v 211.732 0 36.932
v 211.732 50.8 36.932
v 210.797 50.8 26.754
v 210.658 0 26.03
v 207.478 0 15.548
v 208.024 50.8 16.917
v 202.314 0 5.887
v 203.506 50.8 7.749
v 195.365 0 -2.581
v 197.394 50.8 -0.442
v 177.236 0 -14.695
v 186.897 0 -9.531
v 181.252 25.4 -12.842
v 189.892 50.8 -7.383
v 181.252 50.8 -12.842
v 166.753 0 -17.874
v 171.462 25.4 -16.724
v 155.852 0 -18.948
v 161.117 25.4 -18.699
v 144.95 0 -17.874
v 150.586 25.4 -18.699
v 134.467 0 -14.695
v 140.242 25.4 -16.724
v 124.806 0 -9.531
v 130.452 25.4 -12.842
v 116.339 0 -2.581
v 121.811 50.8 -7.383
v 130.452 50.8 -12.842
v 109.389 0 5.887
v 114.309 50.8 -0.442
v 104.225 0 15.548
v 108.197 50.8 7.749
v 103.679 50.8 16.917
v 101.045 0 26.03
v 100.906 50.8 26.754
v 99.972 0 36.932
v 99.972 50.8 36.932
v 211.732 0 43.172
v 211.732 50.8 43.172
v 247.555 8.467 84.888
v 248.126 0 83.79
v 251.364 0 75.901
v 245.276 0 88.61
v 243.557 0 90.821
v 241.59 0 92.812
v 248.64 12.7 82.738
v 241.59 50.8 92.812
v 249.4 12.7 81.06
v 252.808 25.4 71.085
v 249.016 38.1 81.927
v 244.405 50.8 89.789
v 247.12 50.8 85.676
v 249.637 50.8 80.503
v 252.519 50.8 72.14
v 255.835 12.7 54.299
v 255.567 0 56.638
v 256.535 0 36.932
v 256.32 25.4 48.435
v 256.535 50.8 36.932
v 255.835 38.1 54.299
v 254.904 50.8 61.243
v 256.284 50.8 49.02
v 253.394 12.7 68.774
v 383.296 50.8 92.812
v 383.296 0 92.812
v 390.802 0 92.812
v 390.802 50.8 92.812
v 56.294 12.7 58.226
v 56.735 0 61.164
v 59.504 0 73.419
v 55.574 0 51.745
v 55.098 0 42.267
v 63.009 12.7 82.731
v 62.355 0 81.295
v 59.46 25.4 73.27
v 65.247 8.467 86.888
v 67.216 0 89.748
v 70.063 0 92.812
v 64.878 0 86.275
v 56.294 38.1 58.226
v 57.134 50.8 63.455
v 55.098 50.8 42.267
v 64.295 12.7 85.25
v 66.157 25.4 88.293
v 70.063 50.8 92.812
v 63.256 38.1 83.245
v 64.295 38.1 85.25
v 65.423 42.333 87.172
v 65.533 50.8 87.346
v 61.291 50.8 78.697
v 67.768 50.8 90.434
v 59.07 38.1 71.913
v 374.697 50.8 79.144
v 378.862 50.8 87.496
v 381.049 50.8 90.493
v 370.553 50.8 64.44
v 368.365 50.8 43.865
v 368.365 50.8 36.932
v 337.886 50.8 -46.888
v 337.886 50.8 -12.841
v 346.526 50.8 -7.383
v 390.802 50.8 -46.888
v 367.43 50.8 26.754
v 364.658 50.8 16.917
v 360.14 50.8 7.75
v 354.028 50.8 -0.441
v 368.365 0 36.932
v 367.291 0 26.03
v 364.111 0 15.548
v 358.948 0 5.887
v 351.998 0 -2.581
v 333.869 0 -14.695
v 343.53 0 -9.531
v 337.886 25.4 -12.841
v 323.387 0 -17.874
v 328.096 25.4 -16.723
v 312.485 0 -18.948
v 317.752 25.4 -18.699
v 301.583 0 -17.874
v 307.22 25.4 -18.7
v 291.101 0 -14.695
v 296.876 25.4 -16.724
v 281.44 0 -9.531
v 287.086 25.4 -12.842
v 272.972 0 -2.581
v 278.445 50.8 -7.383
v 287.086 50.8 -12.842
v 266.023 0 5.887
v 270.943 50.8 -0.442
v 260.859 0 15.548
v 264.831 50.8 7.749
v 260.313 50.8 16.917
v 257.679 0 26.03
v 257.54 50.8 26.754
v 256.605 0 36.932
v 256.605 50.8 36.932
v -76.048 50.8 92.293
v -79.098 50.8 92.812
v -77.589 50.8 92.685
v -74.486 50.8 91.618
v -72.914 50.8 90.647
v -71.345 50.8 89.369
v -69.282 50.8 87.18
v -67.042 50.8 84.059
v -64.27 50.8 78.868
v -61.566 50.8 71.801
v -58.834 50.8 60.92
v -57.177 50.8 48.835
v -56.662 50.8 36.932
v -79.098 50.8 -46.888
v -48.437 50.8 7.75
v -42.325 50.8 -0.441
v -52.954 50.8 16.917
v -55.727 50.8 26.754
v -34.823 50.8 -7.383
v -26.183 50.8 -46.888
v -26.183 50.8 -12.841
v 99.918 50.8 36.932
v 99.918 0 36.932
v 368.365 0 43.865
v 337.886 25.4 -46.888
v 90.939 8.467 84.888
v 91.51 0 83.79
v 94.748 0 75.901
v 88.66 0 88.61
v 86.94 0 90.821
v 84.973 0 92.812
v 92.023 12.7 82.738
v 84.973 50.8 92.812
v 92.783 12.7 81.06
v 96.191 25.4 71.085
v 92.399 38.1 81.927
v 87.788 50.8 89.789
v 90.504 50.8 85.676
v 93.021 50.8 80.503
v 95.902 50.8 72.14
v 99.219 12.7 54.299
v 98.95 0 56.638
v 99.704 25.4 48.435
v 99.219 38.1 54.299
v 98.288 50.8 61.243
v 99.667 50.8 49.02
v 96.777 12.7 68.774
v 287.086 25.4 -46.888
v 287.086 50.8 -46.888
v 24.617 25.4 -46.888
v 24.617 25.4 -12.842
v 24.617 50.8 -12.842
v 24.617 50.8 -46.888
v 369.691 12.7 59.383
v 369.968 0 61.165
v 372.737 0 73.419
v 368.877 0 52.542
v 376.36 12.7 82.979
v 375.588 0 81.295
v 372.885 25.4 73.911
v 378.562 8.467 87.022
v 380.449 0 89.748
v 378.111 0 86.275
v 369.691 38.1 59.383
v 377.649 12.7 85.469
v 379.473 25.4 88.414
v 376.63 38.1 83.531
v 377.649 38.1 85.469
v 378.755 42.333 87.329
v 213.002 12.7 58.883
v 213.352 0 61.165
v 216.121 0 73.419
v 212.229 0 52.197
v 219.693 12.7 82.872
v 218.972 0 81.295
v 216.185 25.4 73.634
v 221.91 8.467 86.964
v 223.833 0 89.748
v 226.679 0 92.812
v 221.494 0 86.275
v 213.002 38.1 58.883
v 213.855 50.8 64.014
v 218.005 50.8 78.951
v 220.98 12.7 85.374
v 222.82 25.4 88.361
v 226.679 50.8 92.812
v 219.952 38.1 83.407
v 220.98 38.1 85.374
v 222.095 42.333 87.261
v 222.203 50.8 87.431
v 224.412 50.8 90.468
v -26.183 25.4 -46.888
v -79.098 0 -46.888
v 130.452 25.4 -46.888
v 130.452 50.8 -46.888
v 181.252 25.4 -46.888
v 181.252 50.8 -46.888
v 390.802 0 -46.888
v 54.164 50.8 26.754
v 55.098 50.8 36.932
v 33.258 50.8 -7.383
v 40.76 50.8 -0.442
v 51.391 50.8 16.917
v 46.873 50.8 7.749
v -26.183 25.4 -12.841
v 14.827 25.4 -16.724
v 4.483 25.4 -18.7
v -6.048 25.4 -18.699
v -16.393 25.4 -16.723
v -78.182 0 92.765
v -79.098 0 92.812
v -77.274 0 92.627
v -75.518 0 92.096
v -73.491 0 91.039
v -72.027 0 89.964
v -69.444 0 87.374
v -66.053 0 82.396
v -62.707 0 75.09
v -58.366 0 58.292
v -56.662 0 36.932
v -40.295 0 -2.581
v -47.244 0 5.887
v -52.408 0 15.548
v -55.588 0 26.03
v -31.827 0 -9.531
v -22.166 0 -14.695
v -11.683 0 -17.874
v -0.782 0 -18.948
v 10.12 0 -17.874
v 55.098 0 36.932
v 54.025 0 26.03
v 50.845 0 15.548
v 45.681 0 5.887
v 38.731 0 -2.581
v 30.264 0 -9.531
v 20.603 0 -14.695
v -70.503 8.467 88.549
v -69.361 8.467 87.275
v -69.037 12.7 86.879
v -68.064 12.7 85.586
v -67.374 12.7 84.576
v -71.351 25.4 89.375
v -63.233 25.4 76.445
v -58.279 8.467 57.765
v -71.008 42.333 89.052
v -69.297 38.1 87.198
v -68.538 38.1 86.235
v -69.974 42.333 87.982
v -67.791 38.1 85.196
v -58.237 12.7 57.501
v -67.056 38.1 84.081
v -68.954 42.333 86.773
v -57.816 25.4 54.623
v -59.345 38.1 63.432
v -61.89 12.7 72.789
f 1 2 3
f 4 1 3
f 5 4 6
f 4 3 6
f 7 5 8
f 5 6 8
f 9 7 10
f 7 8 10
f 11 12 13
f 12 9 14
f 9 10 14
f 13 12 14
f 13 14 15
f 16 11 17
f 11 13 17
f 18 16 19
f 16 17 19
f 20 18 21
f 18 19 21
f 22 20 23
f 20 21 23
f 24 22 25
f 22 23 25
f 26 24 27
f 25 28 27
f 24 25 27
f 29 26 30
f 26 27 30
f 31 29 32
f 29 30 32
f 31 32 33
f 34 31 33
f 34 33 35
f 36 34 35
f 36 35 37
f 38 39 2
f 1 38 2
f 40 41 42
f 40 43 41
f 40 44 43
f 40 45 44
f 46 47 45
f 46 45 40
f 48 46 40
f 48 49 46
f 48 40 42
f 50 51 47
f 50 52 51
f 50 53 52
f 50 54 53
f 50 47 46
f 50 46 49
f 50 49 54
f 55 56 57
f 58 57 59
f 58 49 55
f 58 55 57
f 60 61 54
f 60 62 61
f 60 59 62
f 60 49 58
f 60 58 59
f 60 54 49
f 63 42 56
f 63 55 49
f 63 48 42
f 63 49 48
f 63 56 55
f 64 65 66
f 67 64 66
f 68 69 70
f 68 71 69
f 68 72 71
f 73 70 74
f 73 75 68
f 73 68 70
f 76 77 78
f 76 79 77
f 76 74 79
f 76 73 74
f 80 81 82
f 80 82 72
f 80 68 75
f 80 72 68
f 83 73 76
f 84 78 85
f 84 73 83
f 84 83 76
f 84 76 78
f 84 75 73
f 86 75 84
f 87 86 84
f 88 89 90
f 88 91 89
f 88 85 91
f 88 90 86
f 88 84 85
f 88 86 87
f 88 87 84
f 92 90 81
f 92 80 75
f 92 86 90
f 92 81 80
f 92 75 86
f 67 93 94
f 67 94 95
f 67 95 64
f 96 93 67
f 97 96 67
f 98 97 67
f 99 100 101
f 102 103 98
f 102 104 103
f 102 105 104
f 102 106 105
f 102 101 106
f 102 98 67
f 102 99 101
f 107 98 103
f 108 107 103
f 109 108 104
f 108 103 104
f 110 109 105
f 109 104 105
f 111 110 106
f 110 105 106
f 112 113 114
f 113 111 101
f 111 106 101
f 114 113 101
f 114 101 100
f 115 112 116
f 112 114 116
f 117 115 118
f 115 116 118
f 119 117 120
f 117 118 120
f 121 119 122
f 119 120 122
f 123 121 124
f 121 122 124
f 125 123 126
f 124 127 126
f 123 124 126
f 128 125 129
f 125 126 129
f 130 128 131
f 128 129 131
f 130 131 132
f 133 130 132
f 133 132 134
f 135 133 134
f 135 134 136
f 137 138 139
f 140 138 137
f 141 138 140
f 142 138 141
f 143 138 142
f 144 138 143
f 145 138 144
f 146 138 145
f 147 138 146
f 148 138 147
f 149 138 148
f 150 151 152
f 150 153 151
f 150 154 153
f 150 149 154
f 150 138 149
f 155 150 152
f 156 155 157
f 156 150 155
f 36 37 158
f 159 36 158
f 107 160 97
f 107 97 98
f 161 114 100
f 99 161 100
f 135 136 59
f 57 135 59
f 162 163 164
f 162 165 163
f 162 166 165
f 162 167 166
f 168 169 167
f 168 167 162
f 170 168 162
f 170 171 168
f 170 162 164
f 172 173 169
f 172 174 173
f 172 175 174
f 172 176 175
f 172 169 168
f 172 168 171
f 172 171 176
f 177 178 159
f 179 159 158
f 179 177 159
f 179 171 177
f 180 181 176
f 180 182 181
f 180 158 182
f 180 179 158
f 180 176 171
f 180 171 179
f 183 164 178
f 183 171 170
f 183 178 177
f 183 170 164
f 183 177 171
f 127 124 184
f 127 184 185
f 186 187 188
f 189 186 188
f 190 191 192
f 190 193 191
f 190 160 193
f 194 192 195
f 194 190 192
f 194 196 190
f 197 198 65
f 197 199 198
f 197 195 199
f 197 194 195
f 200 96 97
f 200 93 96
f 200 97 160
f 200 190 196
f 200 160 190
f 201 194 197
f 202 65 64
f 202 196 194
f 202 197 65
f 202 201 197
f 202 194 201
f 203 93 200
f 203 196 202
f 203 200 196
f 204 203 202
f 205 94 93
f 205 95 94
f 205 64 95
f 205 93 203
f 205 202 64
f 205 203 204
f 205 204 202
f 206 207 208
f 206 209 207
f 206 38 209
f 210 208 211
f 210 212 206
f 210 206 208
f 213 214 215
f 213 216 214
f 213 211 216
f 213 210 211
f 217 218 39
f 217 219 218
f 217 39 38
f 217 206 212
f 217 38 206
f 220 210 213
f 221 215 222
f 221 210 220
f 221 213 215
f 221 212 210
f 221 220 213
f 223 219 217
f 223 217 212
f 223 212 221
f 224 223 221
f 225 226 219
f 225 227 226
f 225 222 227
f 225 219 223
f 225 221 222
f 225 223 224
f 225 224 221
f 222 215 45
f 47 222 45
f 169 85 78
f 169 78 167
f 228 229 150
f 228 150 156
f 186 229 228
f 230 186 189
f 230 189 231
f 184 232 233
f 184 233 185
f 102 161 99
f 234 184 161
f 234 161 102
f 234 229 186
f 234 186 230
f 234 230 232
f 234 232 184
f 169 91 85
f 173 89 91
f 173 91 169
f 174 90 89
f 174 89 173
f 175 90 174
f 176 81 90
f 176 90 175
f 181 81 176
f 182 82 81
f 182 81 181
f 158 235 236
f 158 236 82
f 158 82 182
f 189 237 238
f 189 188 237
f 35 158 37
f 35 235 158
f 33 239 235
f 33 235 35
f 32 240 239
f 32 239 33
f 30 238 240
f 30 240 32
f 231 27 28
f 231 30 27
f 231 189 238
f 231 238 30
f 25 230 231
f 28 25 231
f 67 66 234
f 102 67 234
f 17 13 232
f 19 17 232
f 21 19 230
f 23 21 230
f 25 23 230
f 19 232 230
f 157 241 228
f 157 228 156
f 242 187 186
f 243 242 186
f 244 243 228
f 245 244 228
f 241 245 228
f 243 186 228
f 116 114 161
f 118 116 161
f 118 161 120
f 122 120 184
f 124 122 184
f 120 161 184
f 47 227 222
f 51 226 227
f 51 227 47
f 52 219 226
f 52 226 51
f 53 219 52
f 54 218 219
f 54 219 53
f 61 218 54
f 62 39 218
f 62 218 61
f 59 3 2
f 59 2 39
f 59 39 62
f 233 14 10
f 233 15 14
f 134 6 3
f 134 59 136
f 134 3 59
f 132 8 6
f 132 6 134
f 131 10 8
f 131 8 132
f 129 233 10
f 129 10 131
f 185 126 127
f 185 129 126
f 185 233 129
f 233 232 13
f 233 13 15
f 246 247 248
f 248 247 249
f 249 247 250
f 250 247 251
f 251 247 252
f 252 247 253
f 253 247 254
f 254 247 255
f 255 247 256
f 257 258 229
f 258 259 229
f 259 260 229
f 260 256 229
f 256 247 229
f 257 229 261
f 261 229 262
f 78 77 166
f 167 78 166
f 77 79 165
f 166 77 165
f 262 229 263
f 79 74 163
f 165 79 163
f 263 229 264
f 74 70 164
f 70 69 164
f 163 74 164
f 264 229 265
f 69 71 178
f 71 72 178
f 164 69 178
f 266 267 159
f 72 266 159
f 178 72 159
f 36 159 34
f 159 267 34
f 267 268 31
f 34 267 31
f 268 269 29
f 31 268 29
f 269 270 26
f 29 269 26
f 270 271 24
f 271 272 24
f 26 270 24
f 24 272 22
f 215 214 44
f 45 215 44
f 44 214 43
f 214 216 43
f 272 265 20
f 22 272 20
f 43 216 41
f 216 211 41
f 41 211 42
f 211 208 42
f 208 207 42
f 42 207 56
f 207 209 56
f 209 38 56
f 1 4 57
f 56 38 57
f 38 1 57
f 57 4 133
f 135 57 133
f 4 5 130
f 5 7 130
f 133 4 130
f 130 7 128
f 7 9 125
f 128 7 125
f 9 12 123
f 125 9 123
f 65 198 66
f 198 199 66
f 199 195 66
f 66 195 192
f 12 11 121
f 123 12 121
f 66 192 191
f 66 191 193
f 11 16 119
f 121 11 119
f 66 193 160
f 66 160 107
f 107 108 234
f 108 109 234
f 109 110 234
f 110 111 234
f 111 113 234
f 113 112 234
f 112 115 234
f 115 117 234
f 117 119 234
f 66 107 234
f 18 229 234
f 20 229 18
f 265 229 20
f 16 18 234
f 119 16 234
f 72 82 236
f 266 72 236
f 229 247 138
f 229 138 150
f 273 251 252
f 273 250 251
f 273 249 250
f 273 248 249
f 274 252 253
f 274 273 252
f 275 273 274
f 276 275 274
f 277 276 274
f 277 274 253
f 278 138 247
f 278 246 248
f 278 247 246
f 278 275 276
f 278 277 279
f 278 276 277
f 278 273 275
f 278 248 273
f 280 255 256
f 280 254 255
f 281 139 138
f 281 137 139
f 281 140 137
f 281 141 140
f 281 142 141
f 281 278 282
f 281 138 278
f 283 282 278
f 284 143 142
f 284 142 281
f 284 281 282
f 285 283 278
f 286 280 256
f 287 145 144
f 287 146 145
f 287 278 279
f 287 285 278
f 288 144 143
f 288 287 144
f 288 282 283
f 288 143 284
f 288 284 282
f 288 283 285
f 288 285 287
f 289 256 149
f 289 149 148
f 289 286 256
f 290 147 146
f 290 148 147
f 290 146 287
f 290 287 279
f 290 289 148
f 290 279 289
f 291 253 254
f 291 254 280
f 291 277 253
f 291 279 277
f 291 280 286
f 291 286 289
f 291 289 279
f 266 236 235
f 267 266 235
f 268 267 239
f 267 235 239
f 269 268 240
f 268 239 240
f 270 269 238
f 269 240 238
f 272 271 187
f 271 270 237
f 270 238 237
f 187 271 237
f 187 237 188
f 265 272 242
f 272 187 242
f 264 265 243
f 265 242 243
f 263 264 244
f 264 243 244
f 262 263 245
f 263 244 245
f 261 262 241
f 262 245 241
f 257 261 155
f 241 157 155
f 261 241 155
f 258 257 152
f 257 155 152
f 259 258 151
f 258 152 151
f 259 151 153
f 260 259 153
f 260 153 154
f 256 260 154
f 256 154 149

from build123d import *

# Parameters (mm, degrees)
SKETCH1_W           = 469.9
SKETCH1_H           = 139.7
BOSS_EXTRUDE1_DEPTH = 50.8
SKETCH2_R           = 55.88
CUT_EXTRUDE3_DEPTH  = 405.871109401
CUT_EXTRUDE5_DEPTH  = 405.871109401
SKETCH5_W           = 50.8
SKETCH5_H           = 25.4
CUT_EXTRUDE6_DEPTH  = 419.118003235


with BuildPart() as part:
    # Sketch1 → Boss-Extrude1 (new body)
    with BuildSketch(Plane(origin=(0, 0, 0), x_dir=(1, 0, 0), z_dir=(0, 1, 0))):
        with Locations((155.851656231, -22.96185654)):
            Rectangle(SKETCH1_W, SKETCH1_H)
    extrude(amount=BOSS_EXTRUDE1_DEPTH)

    # Sketch2 → Cut-Extrude3 (cut, through all)
    with BuildSketch(Plane(origin=(0, 50.8, 0), x_dir=(1, 0, 0), z_dir=(0, 1, 0))):
        with BuildLine():
            Line((55.098238231, -92.81185654), (55.098238231, -36.93185654))
            ThreePointArc((55.098238231, -36.93185654), (38.731365092, -76.444983544), (-0.781761972, -92.81185654))
            Line((-0.781761972, -92.81185654), (55.098238231, -92.81185654))
        make_face()
        with BuildLine():
            ThreePointArc((-0.781761972, -92.81185654), (-40.294888773, -76.4449834), (-56.661761769, -36.93185654))
            Line((-56.661761769, -36.93185654), (-56.661761769, -92.81185654))
            Line((-56.661761769, -92.81185654), (-0.781761972, -92.81185654))
        make_face()
        with BuildLine():
            Line((99.971656231, -36.93185654), (99.971656231, -92.81185654))
            Line((99.971656231, -92.81185654), (155.851656231, -92.81185654))
            ThreePointArc((155.851656231, -92.81185654), (116.338529299, -76.444983472), (99.971656231, -36.93185654))
        make_face()
        with BuildLine():
            ThreePointArc((211.731656231, -36.93185654), (195.364783164, -76.444983472), (155.851656231, -92.81185654))
            Line((155.851656231, -92.81185654), (211.731656231, -92.81185654))
            Line((211.731656231, -92.81185654), (211.731656231, -36.93185654))
        make_face()
        with BuildLine():
            Line((256.605074231, -36.93185654), (256.605074231, -92.81185654))
            Line((256.605074231, -92.81185654), (312.485074664, -92.81185654))
            ThreePointArc((312.485074664, -92.81185654), (272.971947451, -76.444983625), (256.605074231, -36.93185654))
        make_face()
        with BuildLine():
            ThreePointArc((368.365074231, -36.93185654), (351.998201317, -76.444983319), (312.485074664, -92.81185654))
            Line((312.485074664, -92.81185654), (368.365074231, -92.81185654))
            Line((368.365074231, -92.81185654), (368.365074231, -36.93185654))
        make_face()
        with Locations((312.485074231, -36.93185654)):
            Circle(SKETCH2_R)
        with Locations((155.851656231, -36.93185654)):
            Circle(SKETCH2_R)
        with Locations((-0.781761769, -36.93185654)):
            Circle(SKETCH2_R)
    extrude(amount=-CUT_EXTRUDE3_DEPTH, mode=Mode.SUBTRACT)

    # Sketch3 → Cut-Extrude5 (cut, through all)
    with BuildSketch(Plane(origin=(0, 50.8, 0), x_dir=(1, 0, 0), z_dir=(0, 1, 0))):
        with BuildLine():
            Line((-56.661761769, -92.81185654), (-56.661761769, -36.93185654))
            add(Edge.make_bspline(
                [(-79.098343769, -92.81185654), (-56.661761769, -92.81185654), (-56.661761769, -36.93185654)],
                knots=[0, 0, 0, 1.570796327, 1.570796327, 1.570796327], degree=2, weights=[1, 0.707106781, 1]))
            Line((-79.098343769, -92.81185654), (-56.661761769, -92.81185654))
        make_face()
        with BuildLine():
            add(Edge.make_bspline(
                [(55.098238231, -42.266592873), (55.687318095, -80.198521665), (70.062894281, -92.81185654)],
                knots=[4.75104815, 4.75104815, 4.75104815, 5.944468502, 5.944468502, 5.944468502], degree=2, weights=[1, 0.82718872, 1]))
            Line((55.098238231, -42.266592873), (55.098238231, -92.81185654))
            Line((55.098238231, -92.81185654), (70.062894281, -92.81185654))
        make_face()
        with BuildLine():
            Line((99.971656231, -36.93185654), (99.918392881, -36.93185654))
            add(Edge.make_bspline(
                [(84.973218182, -92.81185654), (100.8764169, -78.858163942), (99.918392881, -36.93185654)],
                knots=[0.338716805, 0.338716805, 0.338716805, 1.627645124, 1.627645124, 1.627645124], degree=2, weights=[1, 0.799421799, 1]))
            Line((84.973218182, -92.81185654), (99.971656231, -92.81185654))
            Line((99.971656231, -92.81185654), (99.971656231, -36.93185654))
        make_face()
        with BuildLine():
            add(Edge.make_bspline(
                [(211.731656231, -43.172150916), (212.553221033, -80.41743909), (226.679294281, -92.81185654)],
                knots=[4.767271474, 4.767271474, 4.767271474, 5.944468502, 5.944468502, 5.944468502], degree=2, weights=[1, 0.831719595, 1]))
            Line((211.731656231, -43.172150916), (211.731656231, -92.81185654))
            Line((211.731656231, -92.81185654), (226.679294281, -92.81185654))
        make_face()
        with BuildLine():
            Line((256.605074231, -36.93185654), (256.534792881, -36.93185654))
            add(Edge.make_bspline(
                [(241.589618182, -92.81185654), (257.4928169, -78.858163942), (256.534792881, -36.93185654)],
                knots=[0.338716805, 0.338716805, 0.338716805, 1.627645124, 1.627645124, 1.627645124], degree=2, weights=[1, 0.799421799, 1]))
            Line((241.589618182, -92.81185654), (256.605074231, -92.81185654))
            Line((256.605074231, -92.81185654), (256.605074231, -36.93185654))
        make_face()
        with BuildLine():
            add(Edge.make_bspline(
                [(368.365074231, -43.865048297), (369.358856755, -80.583477202), (383.295694281, -92.81185654)],
                knots=[4.779694469, 4.779694469, 4.779694469, 5.944468502, 5.944468502, 5.944468502], degree=2, weights=[1, 0.835152126, 1]))
            Line((368.365074231, -43.865048297), (368.365074231, -92.81185654))
            Line((368.365074231, -92.81185654), (383.295694281, -92.81185654))
        make_face()
    extrude(amount=-CUT_EXTRUDE5_DEPTH, mode=Mode.SUBTRACT)

    # Sketch5 → Cut-Extrude6 (cut, through all)
    with BuildSketch(Plane(origin=(0, 0, -46.88814346), x_dir=(-1, 0, 0), z_dir=(0, 0, -1))):
        with Locations((-312.485836231, 38.1)):
            Rectangle(SKETCH5_W, SKETCH5_H)
        with Locations((-155.851656231, 38.1)):
            Rectangle(SKETCH5_W, SKETCH5_H)
        with Locations((0.782523769, 38.1)):
            Rectangle(SKETCH5_W, SKETCH5_H)
    extrude(amount=-CUT_EXTRUDE6_DEPTH, mode=Mode.SUBTRACT)


solid = part.part
